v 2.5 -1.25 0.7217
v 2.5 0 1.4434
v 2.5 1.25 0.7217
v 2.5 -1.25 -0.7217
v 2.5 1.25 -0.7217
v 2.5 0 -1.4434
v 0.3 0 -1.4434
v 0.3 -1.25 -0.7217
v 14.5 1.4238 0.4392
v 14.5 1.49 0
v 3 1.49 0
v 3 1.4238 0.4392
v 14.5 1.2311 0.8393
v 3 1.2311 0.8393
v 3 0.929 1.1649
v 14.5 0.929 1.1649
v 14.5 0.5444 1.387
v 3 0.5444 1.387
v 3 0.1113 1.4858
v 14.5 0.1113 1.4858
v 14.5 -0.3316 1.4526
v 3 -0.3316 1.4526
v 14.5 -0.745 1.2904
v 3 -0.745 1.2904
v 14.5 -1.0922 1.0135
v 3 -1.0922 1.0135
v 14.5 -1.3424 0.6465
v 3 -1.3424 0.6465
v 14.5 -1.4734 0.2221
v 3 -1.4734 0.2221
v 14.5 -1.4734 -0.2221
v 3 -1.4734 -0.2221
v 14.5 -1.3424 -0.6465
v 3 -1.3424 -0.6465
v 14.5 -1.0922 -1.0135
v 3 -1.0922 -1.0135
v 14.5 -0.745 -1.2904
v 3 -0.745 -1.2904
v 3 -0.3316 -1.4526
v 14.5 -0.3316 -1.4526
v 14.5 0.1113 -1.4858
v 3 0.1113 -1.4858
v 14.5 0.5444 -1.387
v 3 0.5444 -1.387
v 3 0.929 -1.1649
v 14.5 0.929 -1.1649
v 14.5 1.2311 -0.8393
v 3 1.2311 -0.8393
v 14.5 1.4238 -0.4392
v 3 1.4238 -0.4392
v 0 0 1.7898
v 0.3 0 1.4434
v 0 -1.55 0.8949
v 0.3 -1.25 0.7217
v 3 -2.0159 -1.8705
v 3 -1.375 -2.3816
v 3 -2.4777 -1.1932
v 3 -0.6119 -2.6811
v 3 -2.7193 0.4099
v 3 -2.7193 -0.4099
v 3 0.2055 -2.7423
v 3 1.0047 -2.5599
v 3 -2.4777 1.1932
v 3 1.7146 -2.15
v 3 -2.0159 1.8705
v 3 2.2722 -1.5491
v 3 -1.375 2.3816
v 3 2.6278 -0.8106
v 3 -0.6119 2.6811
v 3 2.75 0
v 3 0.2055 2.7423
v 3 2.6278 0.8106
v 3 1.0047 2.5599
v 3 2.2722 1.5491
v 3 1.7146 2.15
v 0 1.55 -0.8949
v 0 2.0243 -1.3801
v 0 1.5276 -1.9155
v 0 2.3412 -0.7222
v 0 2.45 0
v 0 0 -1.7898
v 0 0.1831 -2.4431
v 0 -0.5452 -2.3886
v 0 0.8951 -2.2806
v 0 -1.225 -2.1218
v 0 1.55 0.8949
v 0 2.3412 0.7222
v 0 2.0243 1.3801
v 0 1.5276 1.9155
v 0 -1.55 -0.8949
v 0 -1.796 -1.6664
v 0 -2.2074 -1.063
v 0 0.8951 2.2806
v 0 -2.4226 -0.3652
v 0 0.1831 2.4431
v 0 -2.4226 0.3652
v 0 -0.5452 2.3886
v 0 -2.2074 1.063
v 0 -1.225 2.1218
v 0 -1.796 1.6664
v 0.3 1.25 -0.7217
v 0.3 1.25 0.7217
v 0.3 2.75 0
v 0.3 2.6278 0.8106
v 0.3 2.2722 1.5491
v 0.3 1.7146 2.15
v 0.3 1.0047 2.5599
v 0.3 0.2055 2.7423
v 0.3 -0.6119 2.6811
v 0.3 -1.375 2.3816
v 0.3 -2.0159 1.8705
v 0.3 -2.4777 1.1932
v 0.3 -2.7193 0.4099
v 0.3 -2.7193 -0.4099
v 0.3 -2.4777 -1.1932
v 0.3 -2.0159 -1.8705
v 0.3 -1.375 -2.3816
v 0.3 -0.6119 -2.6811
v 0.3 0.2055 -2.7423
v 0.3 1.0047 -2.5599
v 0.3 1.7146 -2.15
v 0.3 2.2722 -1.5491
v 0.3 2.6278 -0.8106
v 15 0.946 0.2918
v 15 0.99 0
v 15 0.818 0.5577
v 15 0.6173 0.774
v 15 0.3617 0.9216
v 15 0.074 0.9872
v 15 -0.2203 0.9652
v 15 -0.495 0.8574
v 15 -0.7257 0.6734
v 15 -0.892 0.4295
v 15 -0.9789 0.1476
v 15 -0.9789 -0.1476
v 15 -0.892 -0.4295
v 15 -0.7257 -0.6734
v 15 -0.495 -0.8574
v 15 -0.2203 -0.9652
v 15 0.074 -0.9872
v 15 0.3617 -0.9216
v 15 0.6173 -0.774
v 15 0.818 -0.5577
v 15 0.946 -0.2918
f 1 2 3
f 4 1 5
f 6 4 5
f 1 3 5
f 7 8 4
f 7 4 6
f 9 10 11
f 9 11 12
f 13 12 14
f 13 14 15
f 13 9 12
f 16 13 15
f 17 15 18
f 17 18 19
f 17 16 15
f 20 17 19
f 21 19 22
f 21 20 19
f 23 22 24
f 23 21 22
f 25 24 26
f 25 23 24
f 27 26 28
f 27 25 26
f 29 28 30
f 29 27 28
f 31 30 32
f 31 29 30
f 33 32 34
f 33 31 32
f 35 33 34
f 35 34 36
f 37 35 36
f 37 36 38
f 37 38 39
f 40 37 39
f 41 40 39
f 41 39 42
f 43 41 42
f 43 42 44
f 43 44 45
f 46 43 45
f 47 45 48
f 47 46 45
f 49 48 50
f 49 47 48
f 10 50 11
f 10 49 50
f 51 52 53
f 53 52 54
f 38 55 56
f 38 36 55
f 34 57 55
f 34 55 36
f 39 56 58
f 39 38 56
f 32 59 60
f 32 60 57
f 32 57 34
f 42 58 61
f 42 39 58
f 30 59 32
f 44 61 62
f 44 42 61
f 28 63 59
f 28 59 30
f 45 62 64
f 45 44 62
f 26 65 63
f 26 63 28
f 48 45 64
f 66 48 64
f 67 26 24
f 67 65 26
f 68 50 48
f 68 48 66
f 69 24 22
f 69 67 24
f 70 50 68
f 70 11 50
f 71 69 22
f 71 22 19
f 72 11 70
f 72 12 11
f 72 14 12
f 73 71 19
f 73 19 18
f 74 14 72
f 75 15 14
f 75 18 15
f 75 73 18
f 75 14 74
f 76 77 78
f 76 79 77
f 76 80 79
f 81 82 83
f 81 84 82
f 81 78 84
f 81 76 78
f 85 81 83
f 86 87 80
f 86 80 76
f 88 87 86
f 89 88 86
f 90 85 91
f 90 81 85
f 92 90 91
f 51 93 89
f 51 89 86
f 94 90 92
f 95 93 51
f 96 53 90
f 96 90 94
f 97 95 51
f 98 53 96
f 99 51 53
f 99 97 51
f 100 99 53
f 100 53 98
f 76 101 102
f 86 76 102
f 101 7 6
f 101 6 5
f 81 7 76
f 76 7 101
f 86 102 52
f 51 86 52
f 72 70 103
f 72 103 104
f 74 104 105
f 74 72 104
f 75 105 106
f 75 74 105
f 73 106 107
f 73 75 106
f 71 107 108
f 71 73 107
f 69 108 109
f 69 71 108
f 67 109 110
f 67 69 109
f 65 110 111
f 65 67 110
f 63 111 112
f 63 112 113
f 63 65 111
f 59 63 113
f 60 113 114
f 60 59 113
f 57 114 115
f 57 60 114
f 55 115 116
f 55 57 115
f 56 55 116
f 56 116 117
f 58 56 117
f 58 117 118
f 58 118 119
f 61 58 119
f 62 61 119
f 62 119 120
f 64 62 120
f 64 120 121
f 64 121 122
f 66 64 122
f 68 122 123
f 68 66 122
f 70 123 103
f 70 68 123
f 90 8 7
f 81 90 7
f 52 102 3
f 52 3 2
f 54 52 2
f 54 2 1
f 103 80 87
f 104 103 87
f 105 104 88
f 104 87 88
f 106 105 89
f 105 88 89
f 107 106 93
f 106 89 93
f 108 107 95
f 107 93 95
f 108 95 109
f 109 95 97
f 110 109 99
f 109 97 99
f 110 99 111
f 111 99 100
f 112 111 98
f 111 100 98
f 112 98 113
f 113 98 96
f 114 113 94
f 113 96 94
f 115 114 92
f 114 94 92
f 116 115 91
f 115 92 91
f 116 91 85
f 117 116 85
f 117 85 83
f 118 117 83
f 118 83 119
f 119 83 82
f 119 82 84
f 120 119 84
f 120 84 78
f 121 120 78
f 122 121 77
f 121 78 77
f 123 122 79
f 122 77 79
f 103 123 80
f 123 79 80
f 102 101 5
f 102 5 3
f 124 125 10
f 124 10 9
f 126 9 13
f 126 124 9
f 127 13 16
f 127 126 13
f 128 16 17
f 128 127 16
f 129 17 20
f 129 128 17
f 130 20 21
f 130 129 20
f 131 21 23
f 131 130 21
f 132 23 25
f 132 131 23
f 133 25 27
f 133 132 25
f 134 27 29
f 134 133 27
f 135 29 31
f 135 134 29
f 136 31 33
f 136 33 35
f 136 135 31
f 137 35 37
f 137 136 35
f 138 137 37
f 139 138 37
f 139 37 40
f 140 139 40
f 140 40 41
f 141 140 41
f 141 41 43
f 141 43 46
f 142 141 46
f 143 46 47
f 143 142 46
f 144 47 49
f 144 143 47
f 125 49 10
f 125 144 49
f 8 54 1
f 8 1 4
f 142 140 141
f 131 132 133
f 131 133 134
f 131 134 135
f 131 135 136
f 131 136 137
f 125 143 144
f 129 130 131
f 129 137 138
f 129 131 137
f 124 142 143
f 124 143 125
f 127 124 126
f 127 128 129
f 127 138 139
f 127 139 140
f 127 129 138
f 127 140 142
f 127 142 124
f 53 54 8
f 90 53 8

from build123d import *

# Parameters (mm, degrees)
CHAMFER1_SIZE      = 0.5
CHAMFER2_SIZE      = 0.3
CUT_EXTRUDE1_DEPTH = 2.5
CHAMFER3_SIZE      = 0.3


with BuildPart() as part:
    # Sketch1 → Revolve1 (revolve)
    with BuildSketch(Plane.XY):
        Polygon((0, 0), (0, 2.75), (3, 2.75), (3, 1.49), (15, 1.49), (15, 0), align=None)
    revolve(axis=Axis((-88.705490849, 0, 0), (1, 0, 0)))

    # Chamfer1
    chamfer1_edges = [part.edges().sort_by_distance(p)[0] for p in [
        (15, -1.49, 0),
    ]]
    chamfer(chamfer1_edges, length=CHAMFER1_SIZE)

    # Chamfer2
    chamfer2_edges = [part.edges().sort_by_distance(p)[0] for p in [
        (0, -2.75, 0),
    ]]
    chamfer(chamfer2_edges, length=CHAMFER2_SIZE)

    # Sketch3 → Cut-Extrude1 (cut)
    with BuildSketch(Plane(origin=(0, 0, 0), x_dir=(0, 0, -1), z_dir=(1, 0, 0))):
        Polygon((-1.443375673, 0), (-0.721687836, -1.25), (0.721687836, -1.25), (1.443375673, 0), (0.721687836, 1.25), (-0.721687836, 1.25), align=None)
    extrude(amount=CUT_EXTRUDE1_DEPTH, mode=Mode.SUBTRACT)

    # Chamfer3
    chamfer3_edges = [part.edges().sort_by_distance(p)[0] for p in [
        (0, 0.625, 1.082531755),
        (0, -0.625, 1.082531755),
        (0, -1.25, 0),
        (0, -0.625, -1.082531755),
        (0, 0.625, -1.082531755),
        (0, 1.25, 0),
    ]]
    chamfer(chamfer3_edges, length=CHAMFER3_SIZE)


solid = part.part
